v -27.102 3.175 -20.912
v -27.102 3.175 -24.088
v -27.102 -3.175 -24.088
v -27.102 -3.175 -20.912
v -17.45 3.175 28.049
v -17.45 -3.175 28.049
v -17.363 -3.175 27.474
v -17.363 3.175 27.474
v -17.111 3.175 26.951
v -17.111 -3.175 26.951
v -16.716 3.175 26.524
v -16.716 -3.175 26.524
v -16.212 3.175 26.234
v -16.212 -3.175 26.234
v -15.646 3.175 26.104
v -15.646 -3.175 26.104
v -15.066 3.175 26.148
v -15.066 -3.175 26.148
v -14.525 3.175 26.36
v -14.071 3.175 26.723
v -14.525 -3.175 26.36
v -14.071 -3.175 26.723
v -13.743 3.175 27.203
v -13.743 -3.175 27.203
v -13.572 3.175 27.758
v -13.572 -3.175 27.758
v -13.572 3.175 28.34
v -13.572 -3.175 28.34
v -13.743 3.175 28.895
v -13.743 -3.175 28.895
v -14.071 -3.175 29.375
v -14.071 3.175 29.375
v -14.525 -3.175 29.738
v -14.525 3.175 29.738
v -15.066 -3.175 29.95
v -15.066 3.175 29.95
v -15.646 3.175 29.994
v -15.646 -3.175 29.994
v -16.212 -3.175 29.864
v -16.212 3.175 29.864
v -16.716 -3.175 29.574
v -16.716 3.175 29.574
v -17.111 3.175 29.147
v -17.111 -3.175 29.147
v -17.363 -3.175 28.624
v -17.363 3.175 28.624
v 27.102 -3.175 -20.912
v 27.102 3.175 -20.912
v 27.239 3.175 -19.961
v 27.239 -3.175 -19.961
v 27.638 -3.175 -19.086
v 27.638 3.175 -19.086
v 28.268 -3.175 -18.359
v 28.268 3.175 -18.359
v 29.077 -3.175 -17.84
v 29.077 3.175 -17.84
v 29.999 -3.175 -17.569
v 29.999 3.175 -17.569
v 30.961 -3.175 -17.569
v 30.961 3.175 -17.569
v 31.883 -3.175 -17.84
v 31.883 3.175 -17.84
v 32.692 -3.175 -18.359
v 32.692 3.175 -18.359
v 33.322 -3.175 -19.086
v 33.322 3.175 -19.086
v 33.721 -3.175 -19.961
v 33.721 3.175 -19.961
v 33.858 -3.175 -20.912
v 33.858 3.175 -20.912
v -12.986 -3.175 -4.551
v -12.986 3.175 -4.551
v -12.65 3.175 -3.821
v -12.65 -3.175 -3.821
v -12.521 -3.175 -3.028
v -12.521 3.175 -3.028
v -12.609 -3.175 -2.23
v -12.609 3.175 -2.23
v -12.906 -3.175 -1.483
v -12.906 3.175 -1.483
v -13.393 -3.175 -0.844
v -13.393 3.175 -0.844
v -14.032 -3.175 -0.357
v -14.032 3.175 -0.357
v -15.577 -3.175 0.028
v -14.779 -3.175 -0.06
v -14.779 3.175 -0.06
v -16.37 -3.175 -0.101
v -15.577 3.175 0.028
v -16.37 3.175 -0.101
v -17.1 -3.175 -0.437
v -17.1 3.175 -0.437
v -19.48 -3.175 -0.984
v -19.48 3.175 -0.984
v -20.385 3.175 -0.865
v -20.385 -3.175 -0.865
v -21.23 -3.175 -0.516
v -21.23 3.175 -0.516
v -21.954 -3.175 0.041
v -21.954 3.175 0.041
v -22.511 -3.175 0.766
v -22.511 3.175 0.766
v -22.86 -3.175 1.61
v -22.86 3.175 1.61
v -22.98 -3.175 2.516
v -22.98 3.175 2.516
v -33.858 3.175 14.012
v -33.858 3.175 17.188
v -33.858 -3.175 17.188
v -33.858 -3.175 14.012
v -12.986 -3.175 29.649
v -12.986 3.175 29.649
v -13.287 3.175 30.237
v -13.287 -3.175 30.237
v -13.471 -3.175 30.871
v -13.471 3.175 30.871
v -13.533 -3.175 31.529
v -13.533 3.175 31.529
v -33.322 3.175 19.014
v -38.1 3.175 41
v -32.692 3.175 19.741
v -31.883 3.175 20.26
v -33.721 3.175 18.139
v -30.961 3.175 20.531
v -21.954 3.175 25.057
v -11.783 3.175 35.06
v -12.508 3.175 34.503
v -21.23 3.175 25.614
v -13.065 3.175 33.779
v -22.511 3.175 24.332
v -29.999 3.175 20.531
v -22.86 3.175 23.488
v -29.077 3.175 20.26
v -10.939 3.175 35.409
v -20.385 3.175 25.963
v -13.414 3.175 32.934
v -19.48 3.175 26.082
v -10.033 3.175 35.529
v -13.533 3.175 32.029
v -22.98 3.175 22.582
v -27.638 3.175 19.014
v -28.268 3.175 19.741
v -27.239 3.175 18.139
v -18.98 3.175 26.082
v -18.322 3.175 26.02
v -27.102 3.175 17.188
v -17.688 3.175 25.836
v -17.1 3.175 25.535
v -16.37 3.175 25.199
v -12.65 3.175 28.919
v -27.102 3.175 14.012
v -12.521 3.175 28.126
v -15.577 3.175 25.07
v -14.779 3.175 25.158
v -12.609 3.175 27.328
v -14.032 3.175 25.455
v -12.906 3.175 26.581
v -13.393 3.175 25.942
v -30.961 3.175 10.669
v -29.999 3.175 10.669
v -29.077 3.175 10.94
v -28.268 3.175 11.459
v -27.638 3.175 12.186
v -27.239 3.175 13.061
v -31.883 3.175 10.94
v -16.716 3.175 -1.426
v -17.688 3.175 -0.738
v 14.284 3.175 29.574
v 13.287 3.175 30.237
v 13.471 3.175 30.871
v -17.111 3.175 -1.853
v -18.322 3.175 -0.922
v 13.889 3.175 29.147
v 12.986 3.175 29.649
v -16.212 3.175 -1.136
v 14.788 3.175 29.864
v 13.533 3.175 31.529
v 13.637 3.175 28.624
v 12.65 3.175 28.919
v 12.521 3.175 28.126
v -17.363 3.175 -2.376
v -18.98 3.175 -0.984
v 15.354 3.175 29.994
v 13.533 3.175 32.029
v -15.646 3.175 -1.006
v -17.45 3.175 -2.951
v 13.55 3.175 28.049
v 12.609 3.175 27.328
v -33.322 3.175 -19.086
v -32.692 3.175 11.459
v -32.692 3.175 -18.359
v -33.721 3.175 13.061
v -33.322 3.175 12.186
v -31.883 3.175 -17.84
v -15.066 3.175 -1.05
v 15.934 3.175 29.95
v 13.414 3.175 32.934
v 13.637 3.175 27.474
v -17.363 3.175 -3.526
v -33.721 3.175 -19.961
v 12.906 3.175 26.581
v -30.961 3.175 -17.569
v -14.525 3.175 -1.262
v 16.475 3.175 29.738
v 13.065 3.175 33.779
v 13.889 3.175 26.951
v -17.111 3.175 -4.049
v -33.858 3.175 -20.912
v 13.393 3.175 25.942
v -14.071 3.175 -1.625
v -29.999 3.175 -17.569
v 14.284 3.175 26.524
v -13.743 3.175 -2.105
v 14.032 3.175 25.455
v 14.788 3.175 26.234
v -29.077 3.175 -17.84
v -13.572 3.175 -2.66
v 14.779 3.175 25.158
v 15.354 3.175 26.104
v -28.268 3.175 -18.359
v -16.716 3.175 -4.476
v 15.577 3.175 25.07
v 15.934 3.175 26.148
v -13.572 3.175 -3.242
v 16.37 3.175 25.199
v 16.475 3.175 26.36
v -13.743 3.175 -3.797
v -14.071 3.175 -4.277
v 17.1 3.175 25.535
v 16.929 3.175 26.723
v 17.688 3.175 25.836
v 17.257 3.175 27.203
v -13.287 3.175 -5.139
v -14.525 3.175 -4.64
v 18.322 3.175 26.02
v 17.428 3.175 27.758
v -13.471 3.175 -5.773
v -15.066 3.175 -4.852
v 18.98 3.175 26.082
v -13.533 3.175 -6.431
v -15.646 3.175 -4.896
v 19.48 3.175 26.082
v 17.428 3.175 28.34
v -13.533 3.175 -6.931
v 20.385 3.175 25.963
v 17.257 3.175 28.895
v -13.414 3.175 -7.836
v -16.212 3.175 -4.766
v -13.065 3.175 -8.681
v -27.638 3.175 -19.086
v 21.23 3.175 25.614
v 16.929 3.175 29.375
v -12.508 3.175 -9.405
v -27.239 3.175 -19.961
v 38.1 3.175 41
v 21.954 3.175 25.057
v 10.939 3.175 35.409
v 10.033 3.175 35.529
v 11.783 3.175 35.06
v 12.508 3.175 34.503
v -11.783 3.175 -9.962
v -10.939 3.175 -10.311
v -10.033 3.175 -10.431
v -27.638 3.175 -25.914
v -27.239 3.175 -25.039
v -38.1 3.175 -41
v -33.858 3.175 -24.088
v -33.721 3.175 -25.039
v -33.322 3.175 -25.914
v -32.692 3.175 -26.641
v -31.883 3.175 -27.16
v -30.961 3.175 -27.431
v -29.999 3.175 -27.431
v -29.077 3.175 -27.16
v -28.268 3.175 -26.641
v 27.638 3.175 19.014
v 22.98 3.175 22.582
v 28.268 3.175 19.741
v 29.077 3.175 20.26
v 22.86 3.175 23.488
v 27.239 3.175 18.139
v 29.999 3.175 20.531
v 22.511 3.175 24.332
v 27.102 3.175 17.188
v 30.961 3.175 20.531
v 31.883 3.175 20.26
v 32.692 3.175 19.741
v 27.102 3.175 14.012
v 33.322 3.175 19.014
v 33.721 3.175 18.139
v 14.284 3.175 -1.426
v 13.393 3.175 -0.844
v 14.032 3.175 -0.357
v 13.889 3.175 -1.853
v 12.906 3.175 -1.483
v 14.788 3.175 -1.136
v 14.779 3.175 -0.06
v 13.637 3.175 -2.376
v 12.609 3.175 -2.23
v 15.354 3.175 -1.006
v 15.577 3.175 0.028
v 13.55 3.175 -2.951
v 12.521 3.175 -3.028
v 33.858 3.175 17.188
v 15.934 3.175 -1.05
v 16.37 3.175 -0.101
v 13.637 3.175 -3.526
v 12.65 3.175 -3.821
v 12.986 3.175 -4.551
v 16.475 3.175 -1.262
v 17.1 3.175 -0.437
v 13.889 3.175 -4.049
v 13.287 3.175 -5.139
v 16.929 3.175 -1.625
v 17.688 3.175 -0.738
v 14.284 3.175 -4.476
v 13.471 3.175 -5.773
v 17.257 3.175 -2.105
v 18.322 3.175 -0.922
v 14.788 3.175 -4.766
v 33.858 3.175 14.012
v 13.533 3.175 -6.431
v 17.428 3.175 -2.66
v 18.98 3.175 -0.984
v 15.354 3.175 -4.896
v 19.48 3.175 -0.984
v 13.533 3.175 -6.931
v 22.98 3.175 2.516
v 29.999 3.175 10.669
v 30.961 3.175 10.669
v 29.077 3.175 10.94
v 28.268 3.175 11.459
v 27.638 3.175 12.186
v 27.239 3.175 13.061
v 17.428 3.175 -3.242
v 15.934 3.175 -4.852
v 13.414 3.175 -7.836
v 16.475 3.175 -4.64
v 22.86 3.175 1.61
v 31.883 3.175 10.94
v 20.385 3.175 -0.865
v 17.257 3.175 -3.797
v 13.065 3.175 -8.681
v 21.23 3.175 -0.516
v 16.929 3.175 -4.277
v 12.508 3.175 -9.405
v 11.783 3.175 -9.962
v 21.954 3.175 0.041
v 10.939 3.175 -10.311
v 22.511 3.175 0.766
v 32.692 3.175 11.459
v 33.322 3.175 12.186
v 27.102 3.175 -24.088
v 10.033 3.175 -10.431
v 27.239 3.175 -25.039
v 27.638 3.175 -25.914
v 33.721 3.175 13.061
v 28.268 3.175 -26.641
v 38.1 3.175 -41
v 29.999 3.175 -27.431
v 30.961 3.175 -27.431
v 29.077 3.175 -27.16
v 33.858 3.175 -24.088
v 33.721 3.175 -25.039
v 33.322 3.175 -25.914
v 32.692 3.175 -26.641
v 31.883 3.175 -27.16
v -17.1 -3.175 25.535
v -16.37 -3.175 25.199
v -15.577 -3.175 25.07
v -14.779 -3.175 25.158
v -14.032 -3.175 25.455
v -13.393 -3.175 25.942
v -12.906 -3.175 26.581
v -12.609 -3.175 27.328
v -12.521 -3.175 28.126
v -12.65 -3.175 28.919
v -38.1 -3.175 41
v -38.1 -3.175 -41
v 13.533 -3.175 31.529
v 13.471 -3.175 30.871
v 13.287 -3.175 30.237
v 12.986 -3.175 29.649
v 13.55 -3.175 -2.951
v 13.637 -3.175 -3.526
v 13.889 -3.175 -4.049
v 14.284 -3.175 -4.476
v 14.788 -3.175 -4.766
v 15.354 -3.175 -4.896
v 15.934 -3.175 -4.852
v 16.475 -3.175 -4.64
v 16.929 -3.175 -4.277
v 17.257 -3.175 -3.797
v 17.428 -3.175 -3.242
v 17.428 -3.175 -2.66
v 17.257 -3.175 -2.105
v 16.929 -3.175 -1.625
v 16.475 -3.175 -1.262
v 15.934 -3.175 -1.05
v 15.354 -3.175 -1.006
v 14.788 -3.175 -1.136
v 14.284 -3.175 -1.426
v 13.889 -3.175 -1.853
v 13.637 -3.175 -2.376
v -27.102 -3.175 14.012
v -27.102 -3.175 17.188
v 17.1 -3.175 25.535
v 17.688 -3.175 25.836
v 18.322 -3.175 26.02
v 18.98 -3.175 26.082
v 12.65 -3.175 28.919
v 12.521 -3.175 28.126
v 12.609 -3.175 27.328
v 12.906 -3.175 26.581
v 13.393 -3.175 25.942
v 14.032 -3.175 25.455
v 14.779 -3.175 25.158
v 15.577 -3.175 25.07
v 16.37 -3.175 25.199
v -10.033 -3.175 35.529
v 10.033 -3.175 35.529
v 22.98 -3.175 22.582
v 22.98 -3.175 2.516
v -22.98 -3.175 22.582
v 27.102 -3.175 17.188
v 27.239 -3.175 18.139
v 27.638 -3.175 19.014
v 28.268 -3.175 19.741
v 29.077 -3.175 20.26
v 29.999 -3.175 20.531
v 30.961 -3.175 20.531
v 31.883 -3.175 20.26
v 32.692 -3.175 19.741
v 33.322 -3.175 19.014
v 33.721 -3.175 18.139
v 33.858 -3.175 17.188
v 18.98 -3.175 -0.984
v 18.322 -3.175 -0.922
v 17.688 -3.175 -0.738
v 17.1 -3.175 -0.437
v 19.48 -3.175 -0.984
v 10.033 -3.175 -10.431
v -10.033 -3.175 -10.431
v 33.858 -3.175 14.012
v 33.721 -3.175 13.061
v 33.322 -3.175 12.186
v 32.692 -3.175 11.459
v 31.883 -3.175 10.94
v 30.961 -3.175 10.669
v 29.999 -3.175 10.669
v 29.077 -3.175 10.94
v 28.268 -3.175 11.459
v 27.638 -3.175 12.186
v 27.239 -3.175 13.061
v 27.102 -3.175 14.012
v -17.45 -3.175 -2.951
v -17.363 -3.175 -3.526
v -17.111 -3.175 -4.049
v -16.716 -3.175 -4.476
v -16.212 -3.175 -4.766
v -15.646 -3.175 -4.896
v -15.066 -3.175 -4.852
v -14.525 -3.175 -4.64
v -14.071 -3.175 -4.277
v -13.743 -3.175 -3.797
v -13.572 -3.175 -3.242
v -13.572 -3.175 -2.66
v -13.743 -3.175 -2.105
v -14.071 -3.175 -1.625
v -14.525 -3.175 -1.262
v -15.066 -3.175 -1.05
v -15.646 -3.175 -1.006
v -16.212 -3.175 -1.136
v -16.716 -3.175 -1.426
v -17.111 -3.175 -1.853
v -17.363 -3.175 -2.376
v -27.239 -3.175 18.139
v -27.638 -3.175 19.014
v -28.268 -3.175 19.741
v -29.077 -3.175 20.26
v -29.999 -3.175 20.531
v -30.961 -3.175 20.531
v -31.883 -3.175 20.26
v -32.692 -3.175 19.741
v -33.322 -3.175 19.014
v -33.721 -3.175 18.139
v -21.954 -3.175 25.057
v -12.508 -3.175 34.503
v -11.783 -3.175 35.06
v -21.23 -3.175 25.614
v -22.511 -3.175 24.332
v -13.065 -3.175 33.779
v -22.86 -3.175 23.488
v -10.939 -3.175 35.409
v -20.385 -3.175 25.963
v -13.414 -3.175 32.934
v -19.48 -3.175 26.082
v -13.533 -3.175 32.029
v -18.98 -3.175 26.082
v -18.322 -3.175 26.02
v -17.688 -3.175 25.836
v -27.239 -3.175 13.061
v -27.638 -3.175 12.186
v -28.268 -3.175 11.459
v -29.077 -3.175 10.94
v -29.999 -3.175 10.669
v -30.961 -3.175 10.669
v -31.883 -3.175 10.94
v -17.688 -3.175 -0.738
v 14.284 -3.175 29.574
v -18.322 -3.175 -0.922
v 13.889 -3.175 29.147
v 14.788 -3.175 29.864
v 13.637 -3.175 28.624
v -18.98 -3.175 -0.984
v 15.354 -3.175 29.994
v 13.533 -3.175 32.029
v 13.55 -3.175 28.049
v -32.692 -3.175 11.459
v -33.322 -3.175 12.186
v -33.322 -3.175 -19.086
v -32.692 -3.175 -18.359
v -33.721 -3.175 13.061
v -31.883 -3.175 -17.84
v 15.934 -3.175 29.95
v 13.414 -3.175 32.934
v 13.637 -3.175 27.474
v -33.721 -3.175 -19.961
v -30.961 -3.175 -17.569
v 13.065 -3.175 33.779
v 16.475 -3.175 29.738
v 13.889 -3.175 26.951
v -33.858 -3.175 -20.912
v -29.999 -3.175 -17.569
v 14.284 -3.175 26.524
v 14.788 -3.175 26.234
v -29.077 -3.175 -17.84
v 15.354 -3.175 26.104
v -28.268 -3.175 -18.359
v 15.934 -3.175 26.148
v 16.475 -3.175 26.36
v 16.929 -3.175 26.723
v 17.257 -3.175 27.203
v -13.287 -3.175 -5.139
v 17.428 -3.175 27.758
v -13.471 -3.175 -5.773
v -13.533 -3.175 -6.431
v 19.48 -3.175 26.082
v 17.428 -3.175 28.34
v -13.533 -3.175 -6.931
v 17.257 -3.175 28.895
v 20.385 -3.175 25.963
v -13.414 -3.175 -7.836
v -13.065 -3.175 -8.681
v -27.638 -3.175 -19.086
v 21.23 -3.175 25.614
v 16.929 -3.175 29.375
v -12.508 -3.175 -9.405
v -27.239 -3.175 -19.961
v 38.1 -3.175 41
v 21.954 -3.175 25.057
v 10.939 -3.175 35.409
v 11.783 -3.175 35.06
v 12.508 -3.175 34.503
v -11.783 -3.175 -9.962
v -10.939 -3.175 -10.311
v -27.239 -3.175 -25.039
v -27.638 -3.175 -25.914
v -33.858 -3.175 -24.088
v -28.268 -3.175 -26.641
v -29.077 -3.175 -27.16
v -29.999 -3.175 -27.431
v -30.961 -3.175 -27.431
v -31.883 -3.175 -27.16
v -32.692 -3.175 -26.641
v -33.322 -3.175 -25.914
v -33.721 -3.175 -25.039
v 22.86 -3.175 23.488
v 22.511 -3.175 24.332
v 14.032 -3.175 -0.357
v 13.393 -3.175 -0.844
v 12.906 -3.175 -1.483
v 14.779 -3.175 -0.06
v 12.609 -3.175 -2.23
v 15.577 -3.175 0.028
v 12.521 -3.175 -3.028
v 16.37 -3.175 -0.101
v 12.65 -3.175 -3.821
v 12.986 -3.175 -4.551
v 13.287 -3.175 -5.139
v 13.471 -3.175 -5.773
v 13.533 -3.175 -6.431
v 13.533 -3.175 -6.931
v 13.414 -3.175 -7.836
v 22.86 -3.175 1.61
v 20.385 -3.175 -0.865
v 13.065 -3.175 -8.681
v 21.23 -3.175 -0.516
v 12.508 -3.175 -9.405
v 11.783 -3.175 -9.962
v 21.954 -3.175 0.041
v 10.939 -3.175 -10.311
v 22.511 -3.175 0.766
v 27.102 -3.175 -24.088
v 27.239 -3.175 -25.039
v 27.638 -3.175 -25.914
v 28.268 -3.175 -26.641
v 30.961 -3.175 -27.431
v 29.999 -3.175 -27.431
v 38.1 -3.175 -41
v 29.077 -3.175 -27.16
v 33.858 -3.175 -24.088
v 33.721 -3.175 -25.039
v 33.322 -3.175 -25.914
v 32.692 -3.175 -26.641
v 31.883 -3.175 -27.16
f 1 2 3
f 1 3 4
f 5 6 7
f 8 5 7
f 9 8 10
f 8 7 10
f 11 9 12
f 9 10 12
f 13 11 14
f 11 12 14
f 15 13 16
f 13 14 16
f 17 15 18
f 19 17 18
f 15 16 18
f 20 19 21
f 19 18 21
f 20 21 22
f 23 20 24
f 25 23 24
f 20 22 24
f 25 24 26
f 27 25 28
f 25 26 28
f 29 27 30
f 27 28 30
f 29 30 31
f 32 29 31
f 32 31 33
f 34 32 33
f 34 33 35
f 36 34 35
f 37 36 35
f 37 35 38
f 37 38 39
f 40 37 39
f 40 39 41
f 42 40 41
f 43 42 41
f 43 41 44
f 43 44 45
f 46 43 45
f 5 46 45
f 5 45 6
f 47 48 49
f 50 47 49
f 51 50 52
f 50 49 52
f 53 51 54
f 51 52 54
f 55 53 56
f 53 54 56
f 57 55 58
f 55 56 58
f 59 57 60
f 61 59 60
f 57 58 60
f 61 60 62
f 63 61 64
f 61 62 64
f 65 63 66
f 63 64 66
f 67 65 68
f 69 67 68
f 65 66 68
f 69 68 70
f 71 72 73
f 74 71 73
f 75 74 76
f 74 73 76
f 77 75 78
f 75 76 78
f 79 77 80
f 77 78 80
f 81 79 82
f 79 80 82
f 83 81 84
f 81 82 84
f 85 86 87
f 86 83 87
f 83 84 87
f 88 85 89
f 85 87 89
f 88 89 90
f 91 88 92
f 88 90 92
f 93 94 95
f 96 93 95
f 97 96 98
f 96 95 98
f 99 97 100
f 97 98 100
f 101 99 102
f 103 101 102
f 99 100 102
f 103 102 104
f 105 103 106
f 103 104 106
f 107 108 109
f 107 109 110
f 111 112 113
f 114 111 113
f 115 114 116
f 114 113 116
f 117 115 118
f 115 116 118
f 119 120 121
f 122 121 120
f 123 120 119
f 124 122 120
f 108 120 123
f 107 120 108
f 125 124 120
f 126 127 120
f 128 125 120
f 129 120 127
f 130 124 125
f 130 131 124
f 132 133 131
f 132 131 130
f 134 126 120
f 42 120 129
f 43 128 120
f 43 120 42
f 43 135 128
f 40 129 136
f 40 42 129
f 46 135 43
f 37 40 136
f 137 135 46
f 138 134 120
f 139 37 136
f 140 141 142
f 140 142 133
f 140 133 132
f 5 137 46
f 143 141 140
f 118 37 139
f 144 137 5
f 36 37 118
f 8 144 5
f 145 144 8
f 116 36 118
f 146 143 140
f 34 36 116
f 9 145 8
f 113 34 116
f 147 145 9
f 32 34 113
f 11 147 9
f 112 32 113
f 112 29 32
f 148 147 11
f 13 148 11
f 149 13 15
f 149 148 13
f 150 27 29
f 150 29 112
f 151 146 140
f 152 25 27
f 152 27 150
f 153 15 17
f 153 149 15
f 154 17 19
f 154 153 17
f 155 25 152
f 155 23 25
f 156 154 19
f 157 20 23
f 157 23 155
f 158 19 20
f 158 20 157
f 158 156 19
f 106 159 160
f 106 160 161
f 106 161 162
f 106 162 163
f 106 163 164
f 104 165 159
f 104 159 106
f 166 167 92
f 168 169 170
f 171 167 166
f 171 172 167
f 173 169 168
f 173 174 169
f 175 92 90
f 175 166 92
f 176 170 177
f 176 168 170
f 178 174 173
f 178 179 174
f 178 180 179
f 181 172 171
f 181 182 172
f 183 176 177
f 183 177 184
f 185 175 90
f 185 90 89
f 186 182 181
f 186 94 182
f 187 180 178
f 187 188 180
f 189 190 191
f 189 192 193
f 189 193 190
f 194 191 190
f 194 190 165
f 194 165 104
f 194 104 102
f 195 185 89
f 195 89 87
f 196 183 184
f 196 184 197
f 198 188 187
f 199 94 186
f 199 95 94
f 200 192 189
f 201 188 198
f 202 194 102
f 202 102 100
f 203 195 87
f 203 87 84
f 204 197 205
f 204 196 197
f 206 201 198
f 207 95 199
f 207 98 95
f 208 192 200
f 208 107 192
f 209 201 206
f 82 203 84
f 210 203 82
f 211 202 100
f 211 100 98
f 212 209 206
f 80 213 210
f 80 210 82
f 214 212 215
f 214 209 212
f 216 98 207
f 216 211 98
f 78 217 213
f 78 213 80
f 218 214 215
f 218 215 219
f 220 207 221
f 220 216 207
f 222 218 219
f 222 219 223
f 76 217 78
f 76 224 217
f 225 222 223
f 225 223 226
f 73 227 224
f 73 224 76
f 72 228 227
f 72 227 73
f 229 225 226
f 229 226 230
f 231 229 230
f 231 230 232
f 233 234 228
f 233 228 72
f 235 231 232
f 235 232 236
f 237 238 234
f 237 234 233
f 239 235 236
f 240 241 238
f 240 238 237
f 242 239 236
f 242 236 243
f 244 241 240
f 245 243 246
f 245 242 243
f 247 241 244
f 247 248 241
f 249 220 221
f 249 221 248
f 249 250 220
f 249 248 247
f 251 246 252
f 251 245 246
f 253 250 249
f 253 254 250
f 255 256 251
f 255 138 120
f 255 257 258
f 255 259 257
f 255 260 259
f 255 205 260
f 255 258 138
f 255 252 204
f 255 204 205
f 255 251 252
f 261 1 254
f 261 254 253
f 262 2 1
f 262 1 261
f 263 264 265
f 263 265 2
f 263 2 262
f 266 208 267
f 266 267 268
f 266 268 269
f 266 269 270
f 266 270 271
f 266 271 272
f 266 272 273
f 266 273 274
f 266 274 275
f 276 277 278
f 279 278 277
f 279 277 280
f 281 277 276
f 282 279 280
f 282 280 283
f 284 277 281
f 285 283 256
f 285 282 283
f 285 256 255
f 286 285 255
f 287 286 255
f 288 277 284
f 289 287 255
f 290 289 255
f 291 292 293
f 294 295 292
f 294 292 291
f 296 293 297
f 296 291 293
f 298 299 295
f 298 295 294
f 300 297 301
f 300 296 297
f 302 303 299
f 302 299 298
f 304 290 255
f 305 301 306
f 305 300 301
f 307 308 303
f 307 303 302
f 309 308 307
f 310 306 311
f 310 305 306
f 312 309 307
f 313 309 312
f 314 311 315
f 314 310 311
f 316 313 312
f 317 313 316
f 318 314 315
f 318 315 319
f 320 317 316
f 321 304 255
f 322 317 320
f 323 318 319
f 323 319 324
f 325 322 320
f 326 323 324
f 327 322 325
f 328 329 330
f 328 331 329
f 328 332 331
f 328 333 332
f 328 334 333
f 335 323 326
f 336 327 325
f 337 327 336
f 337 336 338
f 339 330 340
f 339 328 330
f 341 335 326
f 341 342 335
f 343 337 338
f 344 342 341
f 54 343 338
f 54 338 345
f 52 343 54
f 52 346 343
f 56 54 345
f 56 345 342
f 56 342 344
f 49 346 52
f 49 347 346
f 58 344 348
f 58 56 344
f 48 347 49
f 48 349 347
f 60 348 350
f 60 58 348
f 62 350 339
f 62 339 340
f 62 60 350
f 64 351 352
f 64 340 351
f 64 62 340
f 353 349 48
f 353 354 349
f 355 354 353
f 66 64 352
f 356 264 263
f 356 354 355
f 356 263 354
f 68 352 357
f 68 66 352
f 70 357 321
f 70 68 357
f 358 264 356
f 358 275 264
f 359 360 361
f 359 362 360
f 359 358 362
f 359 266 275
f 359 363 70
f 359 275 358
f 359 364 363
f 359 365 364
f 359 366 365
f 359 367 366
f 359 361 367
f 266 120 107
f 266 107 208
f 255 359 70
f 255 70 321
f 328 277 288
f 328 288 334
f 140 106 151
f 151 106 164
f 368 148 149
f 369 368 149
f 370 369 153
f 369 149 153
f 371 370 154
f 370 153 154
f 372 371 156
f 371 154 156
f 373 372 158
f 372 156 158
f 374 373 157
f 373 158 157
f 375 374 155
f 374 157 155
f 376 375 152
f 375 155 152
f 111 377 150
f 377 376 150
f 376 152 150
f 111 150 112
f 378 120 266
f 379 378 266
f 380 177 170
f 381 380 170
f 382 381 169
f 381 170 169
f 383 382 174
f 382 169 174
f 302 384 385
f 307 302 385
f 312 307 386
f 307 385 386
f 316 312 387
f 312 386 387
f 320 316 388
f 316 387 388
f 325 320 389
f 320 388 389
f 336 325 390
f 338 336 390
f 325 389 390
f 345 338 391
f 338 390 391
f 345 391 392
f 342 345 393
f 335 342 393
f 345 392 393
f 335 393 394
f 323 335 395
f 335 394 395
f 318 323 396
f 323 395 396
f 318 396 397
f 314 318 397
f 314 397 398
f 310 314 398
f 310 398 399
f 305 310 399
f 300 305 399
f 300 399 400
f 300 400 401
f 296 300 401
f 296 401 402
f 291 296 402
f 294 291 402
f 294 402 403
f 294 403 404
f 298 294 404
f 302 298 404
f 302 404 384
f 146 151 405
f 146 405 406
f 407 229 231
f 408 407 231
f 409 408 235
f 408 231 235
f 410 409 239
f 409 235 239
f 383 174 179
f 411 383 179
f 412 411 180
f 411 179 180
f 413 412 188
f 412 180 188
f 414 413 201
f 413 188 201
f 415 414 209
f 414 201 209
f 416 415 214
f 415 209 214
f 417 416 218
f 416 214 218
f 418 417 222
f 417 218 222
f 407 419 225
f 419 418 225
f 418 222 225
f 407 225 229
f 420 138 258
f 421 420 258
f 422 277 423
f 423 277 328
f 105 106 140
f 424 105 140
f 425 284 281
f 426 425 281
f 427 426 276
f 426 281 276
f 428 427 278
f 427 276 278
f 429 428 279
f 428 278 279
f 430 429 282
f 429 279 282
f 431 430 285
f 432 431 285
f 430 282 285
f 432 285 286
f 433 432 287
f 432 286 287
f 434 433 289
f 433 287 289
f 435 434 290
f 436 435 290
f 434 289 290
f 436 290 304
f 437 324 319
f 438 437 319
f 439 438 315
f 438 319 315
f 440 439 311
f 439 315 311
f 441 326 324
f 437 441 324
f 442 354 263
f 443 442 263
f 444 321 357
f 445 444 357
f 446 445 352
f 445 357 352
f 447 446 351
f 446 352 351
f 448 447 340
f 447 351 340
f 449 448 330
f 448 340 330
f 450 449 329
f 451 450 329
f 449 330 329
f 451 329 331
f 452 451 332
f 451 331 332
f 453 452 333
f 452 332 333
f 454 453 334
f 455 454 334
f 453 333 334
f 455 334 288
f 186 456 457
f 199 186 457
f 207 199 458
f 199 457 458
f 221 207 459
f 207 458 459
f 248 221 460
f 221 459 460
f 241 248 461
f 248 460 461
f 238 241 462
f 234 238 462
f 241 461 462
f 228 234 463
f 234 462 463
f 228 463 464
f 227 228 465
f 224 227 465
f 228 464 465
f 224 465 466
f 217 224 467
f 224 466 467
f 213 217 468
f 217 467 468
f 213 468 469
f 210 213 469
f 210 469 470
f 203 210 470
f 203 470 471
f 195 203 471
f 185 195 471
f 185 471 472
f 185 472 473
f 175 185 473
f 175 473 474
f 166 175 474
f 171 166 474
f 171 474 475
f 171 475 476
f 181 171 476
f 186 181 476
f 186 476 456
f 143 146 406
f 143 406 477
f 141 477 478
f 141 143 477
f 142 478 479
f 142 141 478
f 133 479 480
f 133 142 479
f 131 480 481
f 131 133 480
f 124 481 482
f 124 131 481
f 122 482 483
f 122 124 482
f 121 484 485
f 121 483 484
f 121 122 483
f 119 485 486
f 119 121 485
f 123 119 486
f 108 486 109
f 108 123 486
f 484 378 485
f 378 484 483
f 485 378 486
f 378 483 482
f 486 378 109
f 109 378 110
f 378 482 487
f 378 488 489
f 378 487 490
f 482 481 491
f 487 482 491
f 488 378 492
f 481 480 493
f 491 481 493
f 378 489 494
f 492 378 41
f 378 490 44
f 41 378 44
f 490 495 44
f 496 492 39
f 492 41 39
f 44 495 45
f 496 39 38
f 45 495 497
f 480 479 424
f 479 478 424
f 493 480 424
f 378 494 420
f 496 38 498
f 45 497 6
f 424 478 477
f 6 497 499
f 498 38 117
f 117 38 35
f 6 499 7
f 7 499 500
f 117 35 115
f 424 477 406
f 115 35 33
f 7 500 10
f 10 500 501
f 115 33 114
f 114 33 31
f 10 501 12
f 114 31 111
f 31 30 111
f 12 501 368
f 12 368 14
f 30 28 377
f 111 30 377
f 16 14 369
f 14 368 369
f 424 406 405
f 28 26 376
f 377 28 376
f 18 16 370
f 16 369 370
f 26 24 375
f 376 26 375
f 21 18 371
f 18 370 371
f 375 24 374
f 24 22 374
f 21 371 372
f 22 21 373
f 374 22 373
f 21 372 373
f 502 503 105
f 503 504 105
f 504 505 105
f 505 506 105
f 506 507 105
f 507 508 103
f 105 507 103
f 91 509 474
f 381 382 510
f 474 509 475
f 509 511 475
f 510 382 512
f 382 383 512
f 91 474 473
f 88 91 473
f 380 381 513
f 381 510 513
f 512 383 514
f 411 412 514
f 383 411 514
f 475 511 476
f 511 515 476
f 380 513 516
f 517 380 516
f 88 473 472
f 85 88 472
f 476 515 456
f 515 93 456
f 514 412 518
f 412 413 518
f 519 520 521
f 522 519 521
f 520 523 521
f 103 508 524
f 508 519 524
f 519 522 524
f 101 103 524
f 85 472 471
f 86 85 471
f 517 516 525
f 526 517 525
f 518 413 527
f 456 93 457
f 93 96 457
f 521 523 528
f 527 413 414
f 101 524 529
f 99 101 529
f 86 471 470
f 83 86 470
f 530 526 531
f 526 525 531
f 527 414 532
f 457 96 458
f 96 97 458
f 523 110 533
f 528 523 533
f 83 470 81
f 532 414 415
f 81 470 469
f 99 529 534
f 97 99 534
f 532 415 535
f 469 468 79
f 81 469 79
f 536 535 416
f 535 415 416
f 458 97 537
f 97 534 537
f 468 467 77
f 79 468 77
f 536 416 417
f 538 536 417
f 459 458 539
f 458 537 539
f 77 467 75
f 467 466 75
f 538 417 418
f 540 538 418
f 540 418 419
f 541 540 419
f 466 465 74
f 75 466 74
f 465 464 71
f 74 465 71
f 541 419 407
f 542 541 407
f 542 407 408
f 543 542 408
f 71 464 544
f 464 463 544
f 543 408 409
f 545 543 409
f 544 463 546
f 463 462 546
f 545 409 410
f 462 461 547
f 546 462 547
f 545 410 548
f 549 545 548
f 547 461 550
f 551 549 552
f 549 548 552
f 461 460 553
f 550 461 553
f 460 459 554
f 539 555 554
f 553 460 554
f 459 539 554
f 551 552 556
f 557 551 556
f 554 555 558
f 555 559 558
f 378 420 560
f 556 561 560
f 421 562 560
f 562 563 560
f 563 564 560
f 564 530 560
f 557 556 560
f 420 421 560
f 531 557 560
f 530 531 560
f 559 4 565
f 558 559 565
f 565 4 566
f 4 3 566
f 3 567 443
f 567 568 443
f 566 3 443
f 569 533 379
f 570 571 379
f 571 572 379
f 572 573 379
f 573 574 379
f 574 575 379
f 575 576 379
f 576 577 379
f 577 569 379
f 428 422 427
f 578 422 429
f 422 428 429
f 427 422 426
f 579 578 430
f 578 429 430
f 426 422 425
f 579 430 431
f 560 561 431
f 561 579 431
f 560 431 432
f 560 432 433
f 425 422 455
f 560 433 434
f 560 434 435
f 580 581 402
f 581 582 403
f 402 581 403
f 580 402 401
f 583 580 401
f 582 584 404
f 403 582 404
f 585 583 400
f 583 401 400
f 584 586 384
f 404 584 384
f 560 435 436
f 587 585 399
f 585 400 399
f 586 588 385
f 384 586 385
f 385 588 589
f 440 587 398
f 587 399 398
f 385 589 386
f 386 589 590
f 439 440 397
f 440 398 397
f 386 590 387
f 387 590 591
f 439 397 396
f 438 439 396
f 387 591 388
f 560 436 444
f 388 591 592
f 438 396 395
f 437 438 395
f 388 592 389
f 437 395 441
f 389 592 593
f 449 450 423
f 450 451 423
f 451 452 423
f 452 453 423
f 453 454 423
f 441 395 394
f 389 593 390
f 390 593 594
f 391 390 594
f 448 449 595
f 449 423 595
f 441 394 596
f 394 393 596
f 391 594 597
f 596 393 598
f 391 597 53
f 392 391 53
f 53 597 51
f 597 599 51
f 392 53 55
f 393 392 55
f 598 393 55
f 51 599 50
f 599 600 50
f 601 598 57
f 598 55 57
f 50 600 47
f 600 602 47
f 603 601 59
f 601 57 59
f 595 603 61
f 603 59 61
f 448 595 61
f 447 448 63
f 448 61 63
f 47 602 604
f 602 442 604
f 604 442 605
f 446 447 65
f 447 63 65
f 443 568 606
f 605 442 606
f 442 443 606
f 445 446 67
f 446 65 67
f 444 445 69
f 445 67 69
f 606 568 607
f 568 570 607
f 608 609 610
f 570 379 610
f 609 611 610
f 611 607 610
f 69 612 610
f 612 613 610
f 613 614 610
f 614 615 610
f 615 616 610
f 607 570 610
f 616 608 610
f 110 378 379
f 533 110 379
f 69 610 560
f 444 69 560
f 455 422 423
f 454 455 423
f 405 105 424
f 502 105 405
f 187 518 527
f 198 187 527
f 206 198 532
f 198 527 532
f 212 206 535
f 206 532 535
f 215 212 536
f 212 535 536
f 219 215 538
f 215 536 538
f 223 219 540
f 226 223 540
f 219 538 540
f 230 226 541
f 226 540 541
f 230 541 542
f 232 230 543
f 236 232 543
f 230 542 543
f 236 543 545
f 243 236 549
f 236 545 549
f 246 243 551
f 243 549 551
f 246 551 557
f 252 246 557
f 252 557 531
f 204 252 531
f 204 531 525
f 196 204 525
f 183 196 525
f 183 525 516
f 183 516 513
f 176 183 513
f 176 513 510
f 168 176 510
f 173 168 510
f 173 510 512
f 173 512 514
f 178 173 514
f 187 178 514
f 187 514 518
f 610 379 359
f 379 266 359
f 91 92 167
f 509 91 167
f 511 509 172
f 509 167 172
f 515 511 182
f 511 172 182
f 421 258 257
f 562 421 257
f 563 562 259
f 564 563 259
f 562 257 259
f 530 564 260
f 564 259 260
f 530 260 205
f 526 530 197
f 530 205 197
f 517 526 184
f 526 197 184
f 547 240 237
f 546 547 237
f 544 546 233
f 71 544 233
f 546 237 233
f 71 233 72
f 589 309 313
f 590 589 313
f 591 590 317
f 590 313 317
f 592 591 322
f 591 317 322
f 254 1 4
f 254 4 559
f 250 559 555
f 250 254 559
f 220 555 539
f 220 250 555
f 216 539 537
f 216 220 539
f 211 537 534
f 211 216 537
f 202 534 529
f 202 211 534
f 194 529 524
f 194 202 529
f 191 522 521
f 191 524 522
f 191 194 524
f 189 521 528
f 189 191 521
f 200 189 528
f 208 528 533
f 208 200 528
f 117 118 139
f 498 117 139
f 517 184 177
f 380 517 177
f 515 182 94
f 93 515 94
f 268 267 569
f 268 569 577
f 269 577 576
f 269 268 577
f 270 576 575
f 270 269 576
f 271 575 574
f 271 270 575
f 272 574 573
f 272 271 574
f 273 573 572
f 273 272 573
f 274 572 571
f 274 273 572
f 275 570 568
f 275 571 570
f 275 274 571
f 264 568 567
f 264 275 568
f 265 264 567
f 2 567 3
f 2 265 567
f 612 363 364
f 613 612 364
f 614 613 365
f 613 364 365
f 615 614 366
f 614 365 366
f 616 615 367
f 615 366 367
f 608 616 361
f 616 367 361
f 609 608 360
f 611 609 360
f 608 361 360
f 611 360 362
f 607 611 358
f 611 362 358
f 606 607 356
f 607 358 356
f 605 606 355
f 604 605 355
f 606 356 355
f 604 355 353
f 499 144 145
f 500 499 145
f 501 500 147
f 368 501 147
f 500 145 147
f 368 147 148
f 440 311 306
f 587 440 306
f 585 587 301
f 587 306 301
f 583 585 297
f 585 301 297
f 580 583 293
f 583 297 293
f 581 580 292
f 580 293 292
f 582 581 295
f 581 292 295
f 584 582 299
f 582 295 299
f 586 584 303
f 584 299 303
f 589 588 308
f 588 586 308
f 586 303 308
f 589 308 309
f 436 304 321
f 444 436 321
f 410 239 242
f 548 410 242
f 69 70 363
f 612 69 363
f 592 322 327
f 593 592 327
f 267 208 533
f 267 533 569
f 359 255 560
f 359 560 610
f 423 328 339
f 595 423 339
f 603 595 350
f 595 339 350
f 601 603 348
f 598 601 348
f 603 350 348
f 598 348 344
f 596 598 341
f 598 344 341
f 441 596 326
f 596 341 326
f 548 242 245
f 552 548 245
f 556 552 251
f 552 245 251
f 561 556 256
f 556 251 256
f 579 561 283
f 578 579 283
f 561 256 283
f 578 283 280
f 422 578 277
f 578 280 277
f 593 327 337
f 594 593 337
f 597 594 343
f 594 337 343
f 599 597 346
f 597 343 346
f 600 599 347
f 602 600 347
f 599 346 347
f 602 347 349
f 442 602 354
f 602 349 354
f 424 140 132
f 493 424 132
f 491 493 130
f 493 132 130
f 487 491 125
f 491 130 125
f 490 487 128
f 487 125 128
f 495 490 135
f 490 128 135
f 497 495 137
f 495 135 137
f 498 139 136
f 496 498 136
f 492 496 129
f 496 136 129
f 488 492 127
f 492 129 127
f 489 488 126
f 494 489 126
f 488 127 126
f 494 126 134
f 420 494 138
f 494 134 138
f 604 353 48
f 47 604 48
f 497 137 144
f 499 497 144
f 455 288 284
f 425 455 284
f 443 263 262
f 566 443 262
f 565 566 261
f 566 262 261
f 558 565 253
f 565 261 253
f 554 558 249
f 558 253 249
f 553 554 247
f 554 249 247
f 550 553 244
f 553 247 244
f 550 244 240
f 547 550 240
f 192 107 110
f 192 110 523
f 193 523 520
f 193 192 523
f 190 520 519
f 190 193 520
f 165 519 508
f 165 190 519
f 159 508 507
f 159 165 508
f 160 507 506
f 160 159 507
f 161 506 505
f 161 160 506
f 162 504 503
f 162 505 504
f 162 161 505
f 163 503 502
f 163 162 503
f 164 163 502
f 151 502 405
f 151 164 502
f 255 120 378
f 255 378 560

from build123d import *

# Parameters (mm, degrees)
SKETCH1_W              = 76.2
SKETCH1_H              = 82
BOSS_EXTRUDE1_DEPTH    = 3.175
CUT_EXTRUDE2_DEPTH     = 57.328789264
M3_5_CLEARANCE_HOLE1_D = 3.9
CUT_EXTRUDE6_DEPTH     = 57.328789264
CUT_EXTRUDE7_DEPTH     = 57.328789264
CIRPATTERN1_COUNT      = 4


with BuildPart() as part:
    # Sketch1 → Boss-Extrude1 (new, symmetric)
    with BuildSketch(Plane(origin=(0, 0, 0), x_dir=(1, 0, 0), z_dir=(0, 1, 0))):
        Rectangle(SKETCH1_W, SKETCH1_H)
    extrude(amount=BOSS_EXTRUDE1_DEPTH, both=True)

    # Sketch8 → Cut-Extrude2 (cut, through all)
    with BuildSketch(Plane(origin=(0, 3.175, 0), x_dir=(1, 0, 0), z_dir=(0, 1, 0))):
        with BuildLine():
            Line((-33.8582, -17.1875), (-33.8582, -14.0125))
            ThreePointArc((-33.8582, -14.0125), (-30.48, -10.6343), (-27.1018, -14.0125))
            Line((-27.1018, -14.0125), (-27.1018, -17.1875))
            ThreePointArc((-27.1018, -17.1875), (-30.48, -20.5657), (-33.8582, -17.1875))
        make_face()
        with BuildLine():
            Line((-33.8582, 20.9125), (-33.8582, 24.0875))
            ThreePointArc((-33.8582, 24.0875), (-30.48, 27.4657), (-27.1018, 24.0875))
            Line((-27.1018, 24.0875), (-27.1018, 20.9125))
            ThreePointArc((-27.1018, 20.9125), (-30.48, 17.5343), (-33.8582, 20.9125))
        make_face()
    cut_extrude2 = extrude(amount=-CUT_EXTRUDE2_DEPTH, mode=Mode.SUBTRACT)

    # Mirror1: Cut-Extrude2 across plane
    add(cut_extrude2.mirror(Plane(origin=(0, 0, 0), x_dir=(0, 0, 1), z_dir=(1, 0, 0))), mode=Mode.SUBTRACT)

    # M3.5 Clearance Hole1 (through all)
    with Locations(Plane(origin=(0, 3.175, 0), x_dir=(1, 0, 0), z_dir=(0, 1, 0))):
        with Locations((-15.5, 2.951), (15.5, 2.951), (15.5, -28.049), (-15.5, -28.049)):
            Hole(M3_5_CLEARANCE_HOLE1_D / 2)

    # Sketch23 → Cut-Extrude6 (cut, through all)
    with BuildSketch(Plane(origin=(0, 3.175, 0), x_dir=(1, 0, 0), z_dir=(0, 1, 0))):
        with BuildLine():
            Line((-12.9860741, 8.471), (-12.9860741, 4.551180167))
            ThreePointArc((-12.9860741, 4.551180167), (-13.392821792, 0.843821792), (-17.100180167, 0.4370741))
            Line((-17.100180167, 0.4370741), (-21.02, 0.4370741))
            Line((-21.02, 0.4370741), (-21.02, -25.5350741))
            Line((-21.02, -25.5350741), (-17.100180167, -25.5350741))
            ThreePointArc((-17.100180167, -25.5350741), (-13.392821792, -25.941821792), (-12.9860741, -29.649180167))
            Line((-12.9860741, -29.649180167), (-12.9860741, -33.569))
            Line((-12.9860741, -33.569), (12.9860741, -33.569))
            Line((12.9860741, -33.569), (12.9860741, -29.649180167))
            ThreePointArc((12.9860741, -29.649180167), (13.392821792, -25.941821792), (17.100180167, -25.5350741))
            Line((17.100180167, -25.5350741), (21.02, -25.5350741))
            Line((21.02, -25.5350741), (21.02, 0.4370741))
            Line((21.02, 0.4370741), (17.100180167, 0.4370741))
            ThreePointArc((17.100180167, 0.4370741), (13.392821792, 0.843821792), (12.9860741, 4.551180167))
            Line((12.9860741, 4.551180167), (12.9860741, 8.471))
            Line((12.9860741, 8.471), (-12.9860741, 8.471))
        make_face()
    extrude(amount=-CUT_EXTRUDE6_DEPTH, mode=Mode.SUBTRACT)

    # Sketch24 → Cut-Extrude7 (cut, through all)
    with BuildSketch(Plane(origin=(0, 3.175, 0), x_dir=(1, 0, 0), z_dir=(0, 1, 0))):
        with BuildLine():
            Line((-18.979586404, 0.984476566), (-19.479586404, 0.984476566))
            ThreePointArc((-19.479586404, 0.984476566), (-21.954460139, -0.0406497), (-22.979586404, -2.515523434))
            Line((-22.979586404, -2.515523434), (-22.979586404, -22.582476566))
            ThreePointArc((-22.979586404, -22.582476566), (-21.954460139, -25.0573503), (-19.479586404, -26.082476566))
            Line((-19.479586404, -26.082476566), (-18.979586404, -26.082476566))
            ThreePointArc((-18.979586404, -26.082476566), (-18.000834998, -25.942840487), (-17.100180167, -25.5350741))
            ThreePointArc((-17.100180167, -25.5350741), (-13.392821792, -25.941821792), (-12.9860741, -29.649180167))
            Line((-12.9860741, -29.649180167), (-7.9860741, -29.649180167))
            Line((-7.9860741, -29.649180167), (-7.9860741, 4.551180167))
            Line((-7.9860741, 4.551180167), (-12.9860741, 4.551180167))
            ThreePointArc((-12.9860741, 4.551180167), (-13.392821792, 0.843821792), (-17.100180167, 0.4370741))
            ThreePointArc((-17.100180167, 0.4370741), (-18.000834998, 0.844840487), (-18.979586404, 0.984476566))
        make_face()
    cut_extrude7 = extrude(amount=-CUT_EXTRUDE7_DEPTH, mode=Mode.SUBTRACT)

    # CirPattern1: Cut-Extrude7 ×4 about axis
    cirpattern1_axis = Axis((0, 3.175, 12.549), (0, 1, 0))
    for i in range(1, CIRPATTERN1_COUNT):
        add(cut_extrude7.rotate(cirpattern1_axis, i * 360 / CIRPATTERN1_COUNT), mode=Mode.SUBTRACT)


solid = part.part
